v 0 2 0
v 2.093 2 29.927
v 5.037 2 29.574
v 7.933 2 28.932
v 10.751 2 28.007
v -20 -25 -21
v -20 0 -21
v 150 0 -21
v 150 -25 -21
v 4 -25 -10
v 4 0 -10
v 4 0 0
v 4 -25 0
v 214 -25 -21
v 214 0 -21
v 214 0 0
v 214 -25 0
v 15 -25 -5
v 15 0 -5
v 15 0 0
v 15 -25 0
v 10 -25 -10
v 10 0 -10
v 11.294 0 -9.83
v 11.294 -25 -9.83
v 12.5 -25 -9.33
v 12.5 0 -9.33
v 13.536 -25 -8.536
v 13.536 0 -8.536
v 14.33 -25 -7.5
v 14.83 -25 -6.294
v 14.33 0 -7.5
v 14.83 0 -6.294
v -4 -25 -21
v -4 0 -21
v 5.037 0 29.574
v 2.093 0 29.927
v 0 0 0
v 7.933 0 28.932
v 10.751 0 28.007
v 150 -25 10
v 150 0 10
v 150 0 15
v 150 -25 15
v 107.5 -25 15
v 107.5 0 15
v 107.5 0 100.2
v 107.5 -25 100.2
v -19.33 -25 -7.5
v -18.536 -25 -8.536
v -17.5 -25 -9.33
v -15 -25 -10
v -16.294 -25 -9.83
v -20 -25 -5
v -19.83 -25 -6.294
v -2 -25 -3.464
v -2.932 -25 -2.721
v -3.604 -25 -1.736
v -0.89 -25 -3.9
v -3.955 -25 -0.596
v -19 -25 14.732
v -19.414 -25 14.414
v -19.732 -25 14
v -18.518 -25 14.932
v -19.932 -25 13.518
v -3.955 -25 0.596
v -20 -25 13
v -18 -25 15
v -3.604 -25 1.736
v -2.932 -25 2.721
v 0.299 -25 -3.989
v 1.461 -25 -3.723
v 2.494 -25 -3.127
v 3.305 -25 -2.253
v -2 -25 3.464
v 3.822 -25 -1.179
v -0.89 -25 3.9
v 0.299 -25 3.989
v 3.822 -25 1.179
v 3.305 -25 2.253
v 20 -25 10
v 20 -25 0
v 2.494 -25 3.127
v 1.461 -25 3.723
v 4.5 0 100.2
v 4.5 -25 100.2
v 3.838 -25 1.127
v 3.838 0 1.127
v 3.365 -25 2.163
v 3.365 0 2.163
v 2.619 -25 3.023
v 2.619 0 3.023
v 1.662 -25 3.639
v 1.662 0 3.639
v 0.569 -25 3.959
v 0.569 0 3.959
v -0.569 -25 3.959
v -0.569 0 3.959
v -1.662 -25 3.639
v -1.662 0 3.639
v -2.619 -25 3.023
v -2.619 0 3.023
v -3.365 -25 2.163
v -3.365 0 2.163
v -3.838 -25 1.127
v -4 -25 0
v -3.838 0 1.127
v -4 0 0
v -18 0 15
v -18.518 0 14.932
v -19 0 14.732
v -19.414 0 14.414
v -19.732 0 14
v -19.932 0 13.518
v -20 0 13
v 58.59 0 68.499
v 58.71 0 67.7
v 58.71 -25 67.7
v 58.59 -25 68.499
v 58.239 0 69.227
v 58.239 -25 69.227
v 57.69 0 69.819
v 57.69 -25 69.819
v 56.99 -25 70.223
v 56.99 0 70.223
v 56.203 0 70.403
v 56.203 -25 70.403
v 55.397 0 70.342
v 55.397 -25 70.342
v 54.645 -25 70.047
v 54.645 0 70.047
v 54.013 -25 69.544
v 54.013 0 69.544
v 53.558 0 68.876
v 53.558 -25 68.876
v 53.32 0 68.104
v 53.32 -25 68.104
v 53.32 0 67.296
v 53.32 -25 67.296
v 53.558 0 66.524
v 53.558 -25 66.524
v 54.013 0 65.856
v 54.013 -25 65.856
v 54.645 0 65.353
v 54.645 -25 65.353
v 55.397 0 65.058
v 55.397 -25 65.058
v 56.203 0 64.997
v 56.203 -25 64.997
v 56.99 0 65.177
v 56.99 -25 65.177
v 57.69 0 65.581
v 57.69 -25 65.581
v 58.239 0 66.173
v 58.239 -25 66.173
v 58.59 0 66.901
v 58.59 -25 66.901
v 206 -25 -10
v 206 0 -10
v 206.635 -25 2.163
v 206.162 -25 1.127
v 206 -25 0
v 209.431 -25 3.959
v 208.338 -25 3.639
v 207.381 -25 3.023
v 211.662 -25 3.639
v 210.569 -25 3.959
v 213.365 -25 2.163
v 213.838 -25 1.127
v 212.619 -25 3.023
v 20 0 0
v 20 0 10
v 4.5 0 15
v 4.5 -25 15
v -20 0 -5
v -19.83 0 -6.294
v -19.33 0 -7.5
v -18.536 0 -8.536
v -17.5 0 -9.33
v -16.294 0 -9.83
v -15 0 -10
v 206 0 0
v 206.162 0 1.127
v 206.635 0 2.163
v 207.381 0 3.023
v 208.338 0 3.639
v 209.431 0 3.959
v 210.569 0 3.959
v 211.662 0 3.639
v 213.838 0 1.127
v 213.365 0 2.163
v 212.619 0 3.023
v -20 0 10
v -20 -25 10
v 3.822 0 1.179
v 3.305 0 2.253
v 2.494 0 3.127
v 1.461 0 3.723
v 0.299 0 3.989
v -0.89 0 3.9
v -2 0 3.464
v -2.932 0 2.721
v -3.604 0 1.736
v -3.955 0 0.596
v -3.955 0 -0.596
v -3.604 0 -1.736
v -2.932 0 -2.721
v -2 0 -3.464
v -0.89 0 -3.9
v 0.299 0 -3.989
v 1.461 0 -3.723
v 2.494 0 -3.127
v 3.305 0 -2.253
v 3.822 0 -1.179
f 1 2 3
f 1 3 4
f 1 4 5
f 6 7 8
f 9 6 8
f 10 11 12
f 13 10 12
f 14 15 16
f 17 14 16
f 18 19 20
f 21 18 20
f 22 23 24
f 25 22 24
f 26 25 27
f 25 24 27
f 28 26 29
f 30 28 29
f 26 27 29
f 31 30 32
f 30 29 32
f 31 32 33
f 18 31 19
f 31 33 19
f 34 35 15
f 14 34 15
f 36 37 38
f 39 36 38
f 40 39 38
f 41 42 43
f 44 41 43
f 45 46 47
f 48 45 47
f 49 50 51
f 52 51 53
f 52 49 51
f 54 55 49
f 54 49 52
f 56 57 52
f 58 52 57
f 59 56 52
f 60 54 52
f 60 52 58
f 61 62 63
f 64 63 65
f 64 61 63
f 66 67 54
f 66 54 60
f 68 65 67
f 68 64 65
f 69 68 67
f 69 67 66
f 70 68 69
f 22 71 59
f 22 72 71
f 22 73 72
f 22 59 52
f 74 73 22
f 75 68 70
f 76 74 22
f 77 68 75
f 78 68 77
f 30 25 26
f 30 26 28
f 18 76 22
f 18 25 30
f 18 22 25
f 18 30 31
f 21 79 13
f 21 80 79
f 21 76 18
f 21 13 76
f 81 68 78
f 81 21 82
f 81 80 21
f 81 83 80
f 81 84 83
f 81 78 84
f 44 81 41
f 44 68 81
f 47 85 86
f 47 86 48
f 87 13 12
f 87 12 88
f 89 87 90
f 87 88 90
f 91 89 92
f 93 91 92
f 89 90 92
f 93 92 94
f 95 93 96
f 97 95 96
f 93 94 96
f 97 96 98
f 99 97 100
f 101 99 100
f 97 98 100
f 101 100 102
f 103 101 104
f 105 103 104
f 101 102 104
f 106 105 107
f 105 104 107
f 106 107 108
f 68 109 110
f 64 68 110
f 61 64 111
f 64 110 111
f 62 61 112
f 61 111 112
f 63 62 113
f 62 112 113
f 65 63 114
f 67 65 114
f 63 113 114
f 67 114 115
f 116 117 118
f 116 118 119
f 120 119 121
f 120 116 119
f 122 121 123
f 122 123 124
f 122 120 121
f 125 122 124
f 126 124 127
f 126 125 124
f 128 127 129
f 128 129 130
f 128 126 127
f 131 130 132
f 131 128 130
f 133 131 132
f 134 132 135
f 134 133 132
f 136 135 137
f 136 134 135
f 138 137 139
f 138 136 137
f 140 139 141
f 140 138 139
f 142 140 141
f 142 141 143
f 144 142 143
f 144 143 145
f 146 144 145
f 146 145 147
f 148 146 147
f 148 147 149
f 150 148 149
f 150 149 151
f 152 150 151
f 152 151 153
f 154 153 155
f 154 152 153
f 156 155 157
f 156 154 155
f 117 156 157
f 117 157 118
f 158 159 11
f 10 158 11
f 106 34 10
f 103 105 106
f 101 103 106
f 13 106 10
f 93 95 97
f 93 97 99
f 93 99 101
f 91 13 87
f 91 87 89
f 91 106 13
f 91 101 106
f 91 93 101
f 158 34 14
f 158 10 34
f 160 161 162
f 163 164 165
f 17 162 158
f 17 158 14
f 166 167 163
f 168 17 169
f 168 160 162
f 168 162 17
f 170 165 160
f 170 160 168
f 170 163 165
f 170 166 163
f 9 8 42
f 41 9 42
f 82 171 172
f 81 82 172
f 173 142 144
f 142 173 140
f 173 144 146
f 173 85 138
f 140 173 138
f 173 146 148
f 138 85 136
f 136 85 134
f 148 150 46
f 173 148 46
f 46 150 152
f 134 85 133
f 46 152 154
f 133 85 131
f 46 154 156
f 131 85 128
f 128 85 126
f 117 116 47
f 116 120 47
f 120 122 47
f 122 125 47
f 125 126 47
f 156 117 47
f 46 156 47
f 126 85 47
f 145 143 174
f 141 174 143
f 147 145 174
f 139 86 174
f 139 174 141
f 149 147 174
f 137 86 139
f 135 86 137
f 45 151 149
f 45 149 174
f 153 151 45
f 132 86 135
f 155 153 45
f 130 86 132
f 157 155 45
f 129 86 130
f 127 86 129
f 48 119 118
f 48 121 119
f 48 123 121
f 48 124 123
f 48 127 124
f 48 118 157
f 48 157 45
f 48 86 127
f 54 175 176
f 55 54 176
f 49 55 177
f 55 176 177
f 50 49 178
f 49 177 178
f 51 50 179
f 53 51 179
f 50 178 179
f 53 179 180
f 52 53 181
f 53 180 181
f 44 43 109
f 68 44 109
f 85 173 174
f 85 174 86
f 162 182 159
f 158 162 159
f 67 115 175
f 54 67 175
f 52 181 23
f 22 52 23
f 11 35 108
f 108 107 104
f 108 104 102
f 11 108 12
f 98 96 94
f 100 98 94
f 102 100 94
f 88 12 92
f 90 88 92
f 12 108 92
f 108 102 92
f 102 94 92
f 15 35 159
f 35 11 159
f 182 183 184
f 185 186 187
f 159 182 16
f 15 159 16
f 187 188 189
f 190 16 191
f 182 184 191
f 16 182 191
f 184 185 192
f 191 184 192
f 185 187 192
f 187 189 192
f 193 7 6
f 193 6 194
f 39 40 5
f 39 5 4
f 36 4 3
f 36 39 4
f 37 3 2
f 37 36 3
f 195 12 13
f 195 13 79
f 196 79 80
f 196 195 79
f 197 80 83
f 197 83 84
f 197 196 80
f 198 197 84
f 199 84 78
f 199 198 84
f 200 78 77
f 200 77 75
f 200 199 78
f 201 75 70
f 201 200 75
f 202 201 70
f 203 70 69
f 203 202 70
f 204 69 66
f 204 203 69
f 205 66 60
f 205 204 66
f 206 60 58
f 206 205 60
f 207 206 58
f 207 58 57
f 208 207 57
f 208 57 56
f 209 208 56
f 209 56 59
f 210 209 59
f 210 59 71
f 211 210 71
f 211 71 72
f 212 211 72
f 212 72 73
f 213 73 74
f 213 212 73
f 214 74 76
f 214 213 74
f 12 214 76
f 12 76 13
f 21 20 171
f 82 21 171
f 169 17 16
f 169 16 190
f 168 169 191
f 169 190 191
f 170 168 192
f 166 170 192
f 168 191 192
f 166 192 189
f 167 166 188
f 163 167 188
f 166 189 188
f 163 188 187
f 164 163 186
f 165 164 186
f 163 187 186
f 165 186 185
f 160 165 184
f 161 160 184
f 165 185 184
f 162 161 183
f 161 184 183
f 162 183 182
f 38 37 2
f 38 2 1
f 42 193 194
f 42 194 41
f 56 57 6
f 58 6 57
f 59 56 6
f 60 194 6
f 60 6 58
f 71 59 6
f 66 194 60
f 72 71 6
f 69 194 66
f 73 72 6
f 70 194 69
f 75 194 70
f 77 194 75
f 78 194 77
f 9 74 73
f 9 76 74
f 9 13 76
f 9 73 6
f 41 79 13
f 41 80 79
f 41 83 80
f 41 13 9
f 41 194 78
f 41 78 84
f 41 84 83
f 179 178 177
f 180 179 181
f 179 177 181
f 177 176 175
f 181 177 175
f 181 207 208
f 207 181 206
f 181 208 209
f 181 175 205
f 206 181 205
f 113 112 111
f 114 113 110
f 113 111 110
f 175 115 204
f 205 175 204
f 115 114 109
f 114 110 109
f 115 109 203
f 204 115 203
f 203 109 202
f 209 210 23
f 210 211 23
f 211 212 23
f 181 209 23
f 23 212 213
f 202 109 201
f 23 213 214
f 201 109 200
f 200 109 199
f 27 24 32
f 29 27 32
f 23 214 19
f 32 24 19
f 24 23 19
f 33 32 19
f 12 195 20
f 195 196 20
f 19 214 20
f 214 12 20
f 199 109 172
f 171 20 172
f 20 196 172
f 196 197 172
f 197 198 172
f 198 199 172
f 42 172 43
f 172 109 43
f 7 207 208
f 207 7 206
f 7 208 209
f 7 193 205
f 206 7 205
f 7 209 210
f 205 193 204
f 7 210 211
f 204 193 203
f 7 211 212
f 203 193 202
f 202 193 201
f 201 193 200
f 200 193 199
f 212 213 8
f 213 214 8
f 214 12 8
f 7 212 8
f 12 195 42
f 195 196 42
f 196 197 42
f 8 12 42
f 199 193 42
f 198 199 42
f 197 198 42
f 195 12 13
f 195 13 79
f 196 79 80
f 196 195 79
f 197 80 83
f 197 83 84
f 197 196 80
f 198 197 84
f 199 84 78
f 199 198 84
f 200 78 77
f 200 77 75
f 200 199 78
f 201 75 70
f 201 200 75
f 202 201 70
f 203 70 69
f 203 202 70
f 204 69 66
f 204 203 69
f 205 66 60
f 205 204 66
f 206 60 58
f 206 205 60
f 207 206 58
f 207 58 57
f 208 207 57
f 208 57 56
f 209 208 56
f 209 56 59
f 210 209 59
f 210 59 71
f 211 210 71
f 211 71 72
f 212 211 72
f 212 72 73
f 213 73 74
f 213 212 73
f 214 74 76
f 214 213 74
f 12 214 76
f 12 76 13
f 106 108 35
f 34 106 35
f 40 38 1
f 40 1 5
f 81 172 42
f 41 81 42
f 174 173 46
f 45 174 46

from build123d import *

# Parameters (mm, degrees)
F0_W     = 170
F0_H     = 31
F0_R     = 4
F1_DEPTH = 25
F2_R     = 4
F3_DEPTH = 25
F4_W     = 103
F4_H     = 85.2
F4_R     = 2.7103978623
F5_DEPTH = 25
F6_R     = 2.7103978623
F7_DEPTH = 2
F9_DEPTH = 25


with BuildPart() as f1:
    # F0 (on Front) → F1 (new body)
    with BuildSketch(Plane.XZ):
        with Locations((65, -5.5)):
            Rectangle(F0_W, F0_H)
        Circle(F0_R, mode=Mode.SUBTRACT)
    extrude(amount=F1_DEPTH)


with BuildPart() as f3:
    # F2 (on Front) → F3 (new body)
    with BuildSketch(Plane.XZ):
        with BuildLine():
            Line((20, 0), (20, 10))
            Line((20, 10), (150, 10))
            Line((150, 10), (150, 15))
            Line((150, 15), (-18, 15))
            ThreePointArc((-18, 15), (-19.4142135624, 14.4142135624), (-20, 13))
            Line((-20, 13), (-20, -5))
            ThreePointArc((-20, -5), (-18.5355339059, -8.5355339059), (-15, -10))
            Line((-15, -10), (10, -10))
            ThreePointArc((10, -10), (13.5355339059, -8.5355339059), (15, -5))
            Line((15, -5), (15, 0))
            Line((15, 0), (20, 0))
        make_face()
        Circle(F2_R, mode=Mode.SUBTRACT)
    extrude(amount=F3_DEPTH)


with BuildPart() as f5:
    # F4 (on Front) → F5 (new body)
    with BuildSketch(Plane.XZ):
        with Locations((56, 57.6)):
            Rectangle(F4_W, F4_H)
        with Locations((56, 67.7)):
            Circle(F4_R, mode=Mode.SUBTRACT)
    extrude(amount=F5_DEPTH)


with BuildPart() as f7:
    # F6 (on Front) → F7 (new body)
    with BuildSketch(Plane.XZ):
        with Locations((56, 67.7)):
            Circle(F6_R)
    extrude(amount=-F7_DEPTH)


with BuildPart() as f7b:
    # F6 (on Front) → F7, piece 2 (new body)
    with BuildSketch(Plane.XZ):
        with BuildLine():
            Line((0, 0), (10.7510384864, 28.0074127949))
            ThreePointArc((10.7510384864, 28.0074127949), (6.4931884181, 29.2888802136), (2.0926942123, 29.9269215078))
            Line((2.0926942123, 29.9269215078), (0, 0))
        make_face()
    extrude(amount=-F7_DEPTH)


with BuildPart() as f9:
    # F8 (on Front) → F9 (new body)
    with BuildSketch(Plane.XZ):
        with BuildLine():
            Line((4, -10), (4, 0))
            ThreePointArc((4, 0), (0, 4), (-4, 0))
            Line((-4, 0), (-4, -21))
            Line((-4, -21), (214, -21))
            Line((214, -21), (214, 0))
            ThreePointArc((214, 0), (210, 4), (206, 0))
            Line((206, 0), (206, -10))
            Line((206, -10), (4, -10))
        make_face()
    extrude(amount=F9_DEPTH)


solid = Compound([f1.part, f3.part, f5.part, f7b.part, f9.part])
